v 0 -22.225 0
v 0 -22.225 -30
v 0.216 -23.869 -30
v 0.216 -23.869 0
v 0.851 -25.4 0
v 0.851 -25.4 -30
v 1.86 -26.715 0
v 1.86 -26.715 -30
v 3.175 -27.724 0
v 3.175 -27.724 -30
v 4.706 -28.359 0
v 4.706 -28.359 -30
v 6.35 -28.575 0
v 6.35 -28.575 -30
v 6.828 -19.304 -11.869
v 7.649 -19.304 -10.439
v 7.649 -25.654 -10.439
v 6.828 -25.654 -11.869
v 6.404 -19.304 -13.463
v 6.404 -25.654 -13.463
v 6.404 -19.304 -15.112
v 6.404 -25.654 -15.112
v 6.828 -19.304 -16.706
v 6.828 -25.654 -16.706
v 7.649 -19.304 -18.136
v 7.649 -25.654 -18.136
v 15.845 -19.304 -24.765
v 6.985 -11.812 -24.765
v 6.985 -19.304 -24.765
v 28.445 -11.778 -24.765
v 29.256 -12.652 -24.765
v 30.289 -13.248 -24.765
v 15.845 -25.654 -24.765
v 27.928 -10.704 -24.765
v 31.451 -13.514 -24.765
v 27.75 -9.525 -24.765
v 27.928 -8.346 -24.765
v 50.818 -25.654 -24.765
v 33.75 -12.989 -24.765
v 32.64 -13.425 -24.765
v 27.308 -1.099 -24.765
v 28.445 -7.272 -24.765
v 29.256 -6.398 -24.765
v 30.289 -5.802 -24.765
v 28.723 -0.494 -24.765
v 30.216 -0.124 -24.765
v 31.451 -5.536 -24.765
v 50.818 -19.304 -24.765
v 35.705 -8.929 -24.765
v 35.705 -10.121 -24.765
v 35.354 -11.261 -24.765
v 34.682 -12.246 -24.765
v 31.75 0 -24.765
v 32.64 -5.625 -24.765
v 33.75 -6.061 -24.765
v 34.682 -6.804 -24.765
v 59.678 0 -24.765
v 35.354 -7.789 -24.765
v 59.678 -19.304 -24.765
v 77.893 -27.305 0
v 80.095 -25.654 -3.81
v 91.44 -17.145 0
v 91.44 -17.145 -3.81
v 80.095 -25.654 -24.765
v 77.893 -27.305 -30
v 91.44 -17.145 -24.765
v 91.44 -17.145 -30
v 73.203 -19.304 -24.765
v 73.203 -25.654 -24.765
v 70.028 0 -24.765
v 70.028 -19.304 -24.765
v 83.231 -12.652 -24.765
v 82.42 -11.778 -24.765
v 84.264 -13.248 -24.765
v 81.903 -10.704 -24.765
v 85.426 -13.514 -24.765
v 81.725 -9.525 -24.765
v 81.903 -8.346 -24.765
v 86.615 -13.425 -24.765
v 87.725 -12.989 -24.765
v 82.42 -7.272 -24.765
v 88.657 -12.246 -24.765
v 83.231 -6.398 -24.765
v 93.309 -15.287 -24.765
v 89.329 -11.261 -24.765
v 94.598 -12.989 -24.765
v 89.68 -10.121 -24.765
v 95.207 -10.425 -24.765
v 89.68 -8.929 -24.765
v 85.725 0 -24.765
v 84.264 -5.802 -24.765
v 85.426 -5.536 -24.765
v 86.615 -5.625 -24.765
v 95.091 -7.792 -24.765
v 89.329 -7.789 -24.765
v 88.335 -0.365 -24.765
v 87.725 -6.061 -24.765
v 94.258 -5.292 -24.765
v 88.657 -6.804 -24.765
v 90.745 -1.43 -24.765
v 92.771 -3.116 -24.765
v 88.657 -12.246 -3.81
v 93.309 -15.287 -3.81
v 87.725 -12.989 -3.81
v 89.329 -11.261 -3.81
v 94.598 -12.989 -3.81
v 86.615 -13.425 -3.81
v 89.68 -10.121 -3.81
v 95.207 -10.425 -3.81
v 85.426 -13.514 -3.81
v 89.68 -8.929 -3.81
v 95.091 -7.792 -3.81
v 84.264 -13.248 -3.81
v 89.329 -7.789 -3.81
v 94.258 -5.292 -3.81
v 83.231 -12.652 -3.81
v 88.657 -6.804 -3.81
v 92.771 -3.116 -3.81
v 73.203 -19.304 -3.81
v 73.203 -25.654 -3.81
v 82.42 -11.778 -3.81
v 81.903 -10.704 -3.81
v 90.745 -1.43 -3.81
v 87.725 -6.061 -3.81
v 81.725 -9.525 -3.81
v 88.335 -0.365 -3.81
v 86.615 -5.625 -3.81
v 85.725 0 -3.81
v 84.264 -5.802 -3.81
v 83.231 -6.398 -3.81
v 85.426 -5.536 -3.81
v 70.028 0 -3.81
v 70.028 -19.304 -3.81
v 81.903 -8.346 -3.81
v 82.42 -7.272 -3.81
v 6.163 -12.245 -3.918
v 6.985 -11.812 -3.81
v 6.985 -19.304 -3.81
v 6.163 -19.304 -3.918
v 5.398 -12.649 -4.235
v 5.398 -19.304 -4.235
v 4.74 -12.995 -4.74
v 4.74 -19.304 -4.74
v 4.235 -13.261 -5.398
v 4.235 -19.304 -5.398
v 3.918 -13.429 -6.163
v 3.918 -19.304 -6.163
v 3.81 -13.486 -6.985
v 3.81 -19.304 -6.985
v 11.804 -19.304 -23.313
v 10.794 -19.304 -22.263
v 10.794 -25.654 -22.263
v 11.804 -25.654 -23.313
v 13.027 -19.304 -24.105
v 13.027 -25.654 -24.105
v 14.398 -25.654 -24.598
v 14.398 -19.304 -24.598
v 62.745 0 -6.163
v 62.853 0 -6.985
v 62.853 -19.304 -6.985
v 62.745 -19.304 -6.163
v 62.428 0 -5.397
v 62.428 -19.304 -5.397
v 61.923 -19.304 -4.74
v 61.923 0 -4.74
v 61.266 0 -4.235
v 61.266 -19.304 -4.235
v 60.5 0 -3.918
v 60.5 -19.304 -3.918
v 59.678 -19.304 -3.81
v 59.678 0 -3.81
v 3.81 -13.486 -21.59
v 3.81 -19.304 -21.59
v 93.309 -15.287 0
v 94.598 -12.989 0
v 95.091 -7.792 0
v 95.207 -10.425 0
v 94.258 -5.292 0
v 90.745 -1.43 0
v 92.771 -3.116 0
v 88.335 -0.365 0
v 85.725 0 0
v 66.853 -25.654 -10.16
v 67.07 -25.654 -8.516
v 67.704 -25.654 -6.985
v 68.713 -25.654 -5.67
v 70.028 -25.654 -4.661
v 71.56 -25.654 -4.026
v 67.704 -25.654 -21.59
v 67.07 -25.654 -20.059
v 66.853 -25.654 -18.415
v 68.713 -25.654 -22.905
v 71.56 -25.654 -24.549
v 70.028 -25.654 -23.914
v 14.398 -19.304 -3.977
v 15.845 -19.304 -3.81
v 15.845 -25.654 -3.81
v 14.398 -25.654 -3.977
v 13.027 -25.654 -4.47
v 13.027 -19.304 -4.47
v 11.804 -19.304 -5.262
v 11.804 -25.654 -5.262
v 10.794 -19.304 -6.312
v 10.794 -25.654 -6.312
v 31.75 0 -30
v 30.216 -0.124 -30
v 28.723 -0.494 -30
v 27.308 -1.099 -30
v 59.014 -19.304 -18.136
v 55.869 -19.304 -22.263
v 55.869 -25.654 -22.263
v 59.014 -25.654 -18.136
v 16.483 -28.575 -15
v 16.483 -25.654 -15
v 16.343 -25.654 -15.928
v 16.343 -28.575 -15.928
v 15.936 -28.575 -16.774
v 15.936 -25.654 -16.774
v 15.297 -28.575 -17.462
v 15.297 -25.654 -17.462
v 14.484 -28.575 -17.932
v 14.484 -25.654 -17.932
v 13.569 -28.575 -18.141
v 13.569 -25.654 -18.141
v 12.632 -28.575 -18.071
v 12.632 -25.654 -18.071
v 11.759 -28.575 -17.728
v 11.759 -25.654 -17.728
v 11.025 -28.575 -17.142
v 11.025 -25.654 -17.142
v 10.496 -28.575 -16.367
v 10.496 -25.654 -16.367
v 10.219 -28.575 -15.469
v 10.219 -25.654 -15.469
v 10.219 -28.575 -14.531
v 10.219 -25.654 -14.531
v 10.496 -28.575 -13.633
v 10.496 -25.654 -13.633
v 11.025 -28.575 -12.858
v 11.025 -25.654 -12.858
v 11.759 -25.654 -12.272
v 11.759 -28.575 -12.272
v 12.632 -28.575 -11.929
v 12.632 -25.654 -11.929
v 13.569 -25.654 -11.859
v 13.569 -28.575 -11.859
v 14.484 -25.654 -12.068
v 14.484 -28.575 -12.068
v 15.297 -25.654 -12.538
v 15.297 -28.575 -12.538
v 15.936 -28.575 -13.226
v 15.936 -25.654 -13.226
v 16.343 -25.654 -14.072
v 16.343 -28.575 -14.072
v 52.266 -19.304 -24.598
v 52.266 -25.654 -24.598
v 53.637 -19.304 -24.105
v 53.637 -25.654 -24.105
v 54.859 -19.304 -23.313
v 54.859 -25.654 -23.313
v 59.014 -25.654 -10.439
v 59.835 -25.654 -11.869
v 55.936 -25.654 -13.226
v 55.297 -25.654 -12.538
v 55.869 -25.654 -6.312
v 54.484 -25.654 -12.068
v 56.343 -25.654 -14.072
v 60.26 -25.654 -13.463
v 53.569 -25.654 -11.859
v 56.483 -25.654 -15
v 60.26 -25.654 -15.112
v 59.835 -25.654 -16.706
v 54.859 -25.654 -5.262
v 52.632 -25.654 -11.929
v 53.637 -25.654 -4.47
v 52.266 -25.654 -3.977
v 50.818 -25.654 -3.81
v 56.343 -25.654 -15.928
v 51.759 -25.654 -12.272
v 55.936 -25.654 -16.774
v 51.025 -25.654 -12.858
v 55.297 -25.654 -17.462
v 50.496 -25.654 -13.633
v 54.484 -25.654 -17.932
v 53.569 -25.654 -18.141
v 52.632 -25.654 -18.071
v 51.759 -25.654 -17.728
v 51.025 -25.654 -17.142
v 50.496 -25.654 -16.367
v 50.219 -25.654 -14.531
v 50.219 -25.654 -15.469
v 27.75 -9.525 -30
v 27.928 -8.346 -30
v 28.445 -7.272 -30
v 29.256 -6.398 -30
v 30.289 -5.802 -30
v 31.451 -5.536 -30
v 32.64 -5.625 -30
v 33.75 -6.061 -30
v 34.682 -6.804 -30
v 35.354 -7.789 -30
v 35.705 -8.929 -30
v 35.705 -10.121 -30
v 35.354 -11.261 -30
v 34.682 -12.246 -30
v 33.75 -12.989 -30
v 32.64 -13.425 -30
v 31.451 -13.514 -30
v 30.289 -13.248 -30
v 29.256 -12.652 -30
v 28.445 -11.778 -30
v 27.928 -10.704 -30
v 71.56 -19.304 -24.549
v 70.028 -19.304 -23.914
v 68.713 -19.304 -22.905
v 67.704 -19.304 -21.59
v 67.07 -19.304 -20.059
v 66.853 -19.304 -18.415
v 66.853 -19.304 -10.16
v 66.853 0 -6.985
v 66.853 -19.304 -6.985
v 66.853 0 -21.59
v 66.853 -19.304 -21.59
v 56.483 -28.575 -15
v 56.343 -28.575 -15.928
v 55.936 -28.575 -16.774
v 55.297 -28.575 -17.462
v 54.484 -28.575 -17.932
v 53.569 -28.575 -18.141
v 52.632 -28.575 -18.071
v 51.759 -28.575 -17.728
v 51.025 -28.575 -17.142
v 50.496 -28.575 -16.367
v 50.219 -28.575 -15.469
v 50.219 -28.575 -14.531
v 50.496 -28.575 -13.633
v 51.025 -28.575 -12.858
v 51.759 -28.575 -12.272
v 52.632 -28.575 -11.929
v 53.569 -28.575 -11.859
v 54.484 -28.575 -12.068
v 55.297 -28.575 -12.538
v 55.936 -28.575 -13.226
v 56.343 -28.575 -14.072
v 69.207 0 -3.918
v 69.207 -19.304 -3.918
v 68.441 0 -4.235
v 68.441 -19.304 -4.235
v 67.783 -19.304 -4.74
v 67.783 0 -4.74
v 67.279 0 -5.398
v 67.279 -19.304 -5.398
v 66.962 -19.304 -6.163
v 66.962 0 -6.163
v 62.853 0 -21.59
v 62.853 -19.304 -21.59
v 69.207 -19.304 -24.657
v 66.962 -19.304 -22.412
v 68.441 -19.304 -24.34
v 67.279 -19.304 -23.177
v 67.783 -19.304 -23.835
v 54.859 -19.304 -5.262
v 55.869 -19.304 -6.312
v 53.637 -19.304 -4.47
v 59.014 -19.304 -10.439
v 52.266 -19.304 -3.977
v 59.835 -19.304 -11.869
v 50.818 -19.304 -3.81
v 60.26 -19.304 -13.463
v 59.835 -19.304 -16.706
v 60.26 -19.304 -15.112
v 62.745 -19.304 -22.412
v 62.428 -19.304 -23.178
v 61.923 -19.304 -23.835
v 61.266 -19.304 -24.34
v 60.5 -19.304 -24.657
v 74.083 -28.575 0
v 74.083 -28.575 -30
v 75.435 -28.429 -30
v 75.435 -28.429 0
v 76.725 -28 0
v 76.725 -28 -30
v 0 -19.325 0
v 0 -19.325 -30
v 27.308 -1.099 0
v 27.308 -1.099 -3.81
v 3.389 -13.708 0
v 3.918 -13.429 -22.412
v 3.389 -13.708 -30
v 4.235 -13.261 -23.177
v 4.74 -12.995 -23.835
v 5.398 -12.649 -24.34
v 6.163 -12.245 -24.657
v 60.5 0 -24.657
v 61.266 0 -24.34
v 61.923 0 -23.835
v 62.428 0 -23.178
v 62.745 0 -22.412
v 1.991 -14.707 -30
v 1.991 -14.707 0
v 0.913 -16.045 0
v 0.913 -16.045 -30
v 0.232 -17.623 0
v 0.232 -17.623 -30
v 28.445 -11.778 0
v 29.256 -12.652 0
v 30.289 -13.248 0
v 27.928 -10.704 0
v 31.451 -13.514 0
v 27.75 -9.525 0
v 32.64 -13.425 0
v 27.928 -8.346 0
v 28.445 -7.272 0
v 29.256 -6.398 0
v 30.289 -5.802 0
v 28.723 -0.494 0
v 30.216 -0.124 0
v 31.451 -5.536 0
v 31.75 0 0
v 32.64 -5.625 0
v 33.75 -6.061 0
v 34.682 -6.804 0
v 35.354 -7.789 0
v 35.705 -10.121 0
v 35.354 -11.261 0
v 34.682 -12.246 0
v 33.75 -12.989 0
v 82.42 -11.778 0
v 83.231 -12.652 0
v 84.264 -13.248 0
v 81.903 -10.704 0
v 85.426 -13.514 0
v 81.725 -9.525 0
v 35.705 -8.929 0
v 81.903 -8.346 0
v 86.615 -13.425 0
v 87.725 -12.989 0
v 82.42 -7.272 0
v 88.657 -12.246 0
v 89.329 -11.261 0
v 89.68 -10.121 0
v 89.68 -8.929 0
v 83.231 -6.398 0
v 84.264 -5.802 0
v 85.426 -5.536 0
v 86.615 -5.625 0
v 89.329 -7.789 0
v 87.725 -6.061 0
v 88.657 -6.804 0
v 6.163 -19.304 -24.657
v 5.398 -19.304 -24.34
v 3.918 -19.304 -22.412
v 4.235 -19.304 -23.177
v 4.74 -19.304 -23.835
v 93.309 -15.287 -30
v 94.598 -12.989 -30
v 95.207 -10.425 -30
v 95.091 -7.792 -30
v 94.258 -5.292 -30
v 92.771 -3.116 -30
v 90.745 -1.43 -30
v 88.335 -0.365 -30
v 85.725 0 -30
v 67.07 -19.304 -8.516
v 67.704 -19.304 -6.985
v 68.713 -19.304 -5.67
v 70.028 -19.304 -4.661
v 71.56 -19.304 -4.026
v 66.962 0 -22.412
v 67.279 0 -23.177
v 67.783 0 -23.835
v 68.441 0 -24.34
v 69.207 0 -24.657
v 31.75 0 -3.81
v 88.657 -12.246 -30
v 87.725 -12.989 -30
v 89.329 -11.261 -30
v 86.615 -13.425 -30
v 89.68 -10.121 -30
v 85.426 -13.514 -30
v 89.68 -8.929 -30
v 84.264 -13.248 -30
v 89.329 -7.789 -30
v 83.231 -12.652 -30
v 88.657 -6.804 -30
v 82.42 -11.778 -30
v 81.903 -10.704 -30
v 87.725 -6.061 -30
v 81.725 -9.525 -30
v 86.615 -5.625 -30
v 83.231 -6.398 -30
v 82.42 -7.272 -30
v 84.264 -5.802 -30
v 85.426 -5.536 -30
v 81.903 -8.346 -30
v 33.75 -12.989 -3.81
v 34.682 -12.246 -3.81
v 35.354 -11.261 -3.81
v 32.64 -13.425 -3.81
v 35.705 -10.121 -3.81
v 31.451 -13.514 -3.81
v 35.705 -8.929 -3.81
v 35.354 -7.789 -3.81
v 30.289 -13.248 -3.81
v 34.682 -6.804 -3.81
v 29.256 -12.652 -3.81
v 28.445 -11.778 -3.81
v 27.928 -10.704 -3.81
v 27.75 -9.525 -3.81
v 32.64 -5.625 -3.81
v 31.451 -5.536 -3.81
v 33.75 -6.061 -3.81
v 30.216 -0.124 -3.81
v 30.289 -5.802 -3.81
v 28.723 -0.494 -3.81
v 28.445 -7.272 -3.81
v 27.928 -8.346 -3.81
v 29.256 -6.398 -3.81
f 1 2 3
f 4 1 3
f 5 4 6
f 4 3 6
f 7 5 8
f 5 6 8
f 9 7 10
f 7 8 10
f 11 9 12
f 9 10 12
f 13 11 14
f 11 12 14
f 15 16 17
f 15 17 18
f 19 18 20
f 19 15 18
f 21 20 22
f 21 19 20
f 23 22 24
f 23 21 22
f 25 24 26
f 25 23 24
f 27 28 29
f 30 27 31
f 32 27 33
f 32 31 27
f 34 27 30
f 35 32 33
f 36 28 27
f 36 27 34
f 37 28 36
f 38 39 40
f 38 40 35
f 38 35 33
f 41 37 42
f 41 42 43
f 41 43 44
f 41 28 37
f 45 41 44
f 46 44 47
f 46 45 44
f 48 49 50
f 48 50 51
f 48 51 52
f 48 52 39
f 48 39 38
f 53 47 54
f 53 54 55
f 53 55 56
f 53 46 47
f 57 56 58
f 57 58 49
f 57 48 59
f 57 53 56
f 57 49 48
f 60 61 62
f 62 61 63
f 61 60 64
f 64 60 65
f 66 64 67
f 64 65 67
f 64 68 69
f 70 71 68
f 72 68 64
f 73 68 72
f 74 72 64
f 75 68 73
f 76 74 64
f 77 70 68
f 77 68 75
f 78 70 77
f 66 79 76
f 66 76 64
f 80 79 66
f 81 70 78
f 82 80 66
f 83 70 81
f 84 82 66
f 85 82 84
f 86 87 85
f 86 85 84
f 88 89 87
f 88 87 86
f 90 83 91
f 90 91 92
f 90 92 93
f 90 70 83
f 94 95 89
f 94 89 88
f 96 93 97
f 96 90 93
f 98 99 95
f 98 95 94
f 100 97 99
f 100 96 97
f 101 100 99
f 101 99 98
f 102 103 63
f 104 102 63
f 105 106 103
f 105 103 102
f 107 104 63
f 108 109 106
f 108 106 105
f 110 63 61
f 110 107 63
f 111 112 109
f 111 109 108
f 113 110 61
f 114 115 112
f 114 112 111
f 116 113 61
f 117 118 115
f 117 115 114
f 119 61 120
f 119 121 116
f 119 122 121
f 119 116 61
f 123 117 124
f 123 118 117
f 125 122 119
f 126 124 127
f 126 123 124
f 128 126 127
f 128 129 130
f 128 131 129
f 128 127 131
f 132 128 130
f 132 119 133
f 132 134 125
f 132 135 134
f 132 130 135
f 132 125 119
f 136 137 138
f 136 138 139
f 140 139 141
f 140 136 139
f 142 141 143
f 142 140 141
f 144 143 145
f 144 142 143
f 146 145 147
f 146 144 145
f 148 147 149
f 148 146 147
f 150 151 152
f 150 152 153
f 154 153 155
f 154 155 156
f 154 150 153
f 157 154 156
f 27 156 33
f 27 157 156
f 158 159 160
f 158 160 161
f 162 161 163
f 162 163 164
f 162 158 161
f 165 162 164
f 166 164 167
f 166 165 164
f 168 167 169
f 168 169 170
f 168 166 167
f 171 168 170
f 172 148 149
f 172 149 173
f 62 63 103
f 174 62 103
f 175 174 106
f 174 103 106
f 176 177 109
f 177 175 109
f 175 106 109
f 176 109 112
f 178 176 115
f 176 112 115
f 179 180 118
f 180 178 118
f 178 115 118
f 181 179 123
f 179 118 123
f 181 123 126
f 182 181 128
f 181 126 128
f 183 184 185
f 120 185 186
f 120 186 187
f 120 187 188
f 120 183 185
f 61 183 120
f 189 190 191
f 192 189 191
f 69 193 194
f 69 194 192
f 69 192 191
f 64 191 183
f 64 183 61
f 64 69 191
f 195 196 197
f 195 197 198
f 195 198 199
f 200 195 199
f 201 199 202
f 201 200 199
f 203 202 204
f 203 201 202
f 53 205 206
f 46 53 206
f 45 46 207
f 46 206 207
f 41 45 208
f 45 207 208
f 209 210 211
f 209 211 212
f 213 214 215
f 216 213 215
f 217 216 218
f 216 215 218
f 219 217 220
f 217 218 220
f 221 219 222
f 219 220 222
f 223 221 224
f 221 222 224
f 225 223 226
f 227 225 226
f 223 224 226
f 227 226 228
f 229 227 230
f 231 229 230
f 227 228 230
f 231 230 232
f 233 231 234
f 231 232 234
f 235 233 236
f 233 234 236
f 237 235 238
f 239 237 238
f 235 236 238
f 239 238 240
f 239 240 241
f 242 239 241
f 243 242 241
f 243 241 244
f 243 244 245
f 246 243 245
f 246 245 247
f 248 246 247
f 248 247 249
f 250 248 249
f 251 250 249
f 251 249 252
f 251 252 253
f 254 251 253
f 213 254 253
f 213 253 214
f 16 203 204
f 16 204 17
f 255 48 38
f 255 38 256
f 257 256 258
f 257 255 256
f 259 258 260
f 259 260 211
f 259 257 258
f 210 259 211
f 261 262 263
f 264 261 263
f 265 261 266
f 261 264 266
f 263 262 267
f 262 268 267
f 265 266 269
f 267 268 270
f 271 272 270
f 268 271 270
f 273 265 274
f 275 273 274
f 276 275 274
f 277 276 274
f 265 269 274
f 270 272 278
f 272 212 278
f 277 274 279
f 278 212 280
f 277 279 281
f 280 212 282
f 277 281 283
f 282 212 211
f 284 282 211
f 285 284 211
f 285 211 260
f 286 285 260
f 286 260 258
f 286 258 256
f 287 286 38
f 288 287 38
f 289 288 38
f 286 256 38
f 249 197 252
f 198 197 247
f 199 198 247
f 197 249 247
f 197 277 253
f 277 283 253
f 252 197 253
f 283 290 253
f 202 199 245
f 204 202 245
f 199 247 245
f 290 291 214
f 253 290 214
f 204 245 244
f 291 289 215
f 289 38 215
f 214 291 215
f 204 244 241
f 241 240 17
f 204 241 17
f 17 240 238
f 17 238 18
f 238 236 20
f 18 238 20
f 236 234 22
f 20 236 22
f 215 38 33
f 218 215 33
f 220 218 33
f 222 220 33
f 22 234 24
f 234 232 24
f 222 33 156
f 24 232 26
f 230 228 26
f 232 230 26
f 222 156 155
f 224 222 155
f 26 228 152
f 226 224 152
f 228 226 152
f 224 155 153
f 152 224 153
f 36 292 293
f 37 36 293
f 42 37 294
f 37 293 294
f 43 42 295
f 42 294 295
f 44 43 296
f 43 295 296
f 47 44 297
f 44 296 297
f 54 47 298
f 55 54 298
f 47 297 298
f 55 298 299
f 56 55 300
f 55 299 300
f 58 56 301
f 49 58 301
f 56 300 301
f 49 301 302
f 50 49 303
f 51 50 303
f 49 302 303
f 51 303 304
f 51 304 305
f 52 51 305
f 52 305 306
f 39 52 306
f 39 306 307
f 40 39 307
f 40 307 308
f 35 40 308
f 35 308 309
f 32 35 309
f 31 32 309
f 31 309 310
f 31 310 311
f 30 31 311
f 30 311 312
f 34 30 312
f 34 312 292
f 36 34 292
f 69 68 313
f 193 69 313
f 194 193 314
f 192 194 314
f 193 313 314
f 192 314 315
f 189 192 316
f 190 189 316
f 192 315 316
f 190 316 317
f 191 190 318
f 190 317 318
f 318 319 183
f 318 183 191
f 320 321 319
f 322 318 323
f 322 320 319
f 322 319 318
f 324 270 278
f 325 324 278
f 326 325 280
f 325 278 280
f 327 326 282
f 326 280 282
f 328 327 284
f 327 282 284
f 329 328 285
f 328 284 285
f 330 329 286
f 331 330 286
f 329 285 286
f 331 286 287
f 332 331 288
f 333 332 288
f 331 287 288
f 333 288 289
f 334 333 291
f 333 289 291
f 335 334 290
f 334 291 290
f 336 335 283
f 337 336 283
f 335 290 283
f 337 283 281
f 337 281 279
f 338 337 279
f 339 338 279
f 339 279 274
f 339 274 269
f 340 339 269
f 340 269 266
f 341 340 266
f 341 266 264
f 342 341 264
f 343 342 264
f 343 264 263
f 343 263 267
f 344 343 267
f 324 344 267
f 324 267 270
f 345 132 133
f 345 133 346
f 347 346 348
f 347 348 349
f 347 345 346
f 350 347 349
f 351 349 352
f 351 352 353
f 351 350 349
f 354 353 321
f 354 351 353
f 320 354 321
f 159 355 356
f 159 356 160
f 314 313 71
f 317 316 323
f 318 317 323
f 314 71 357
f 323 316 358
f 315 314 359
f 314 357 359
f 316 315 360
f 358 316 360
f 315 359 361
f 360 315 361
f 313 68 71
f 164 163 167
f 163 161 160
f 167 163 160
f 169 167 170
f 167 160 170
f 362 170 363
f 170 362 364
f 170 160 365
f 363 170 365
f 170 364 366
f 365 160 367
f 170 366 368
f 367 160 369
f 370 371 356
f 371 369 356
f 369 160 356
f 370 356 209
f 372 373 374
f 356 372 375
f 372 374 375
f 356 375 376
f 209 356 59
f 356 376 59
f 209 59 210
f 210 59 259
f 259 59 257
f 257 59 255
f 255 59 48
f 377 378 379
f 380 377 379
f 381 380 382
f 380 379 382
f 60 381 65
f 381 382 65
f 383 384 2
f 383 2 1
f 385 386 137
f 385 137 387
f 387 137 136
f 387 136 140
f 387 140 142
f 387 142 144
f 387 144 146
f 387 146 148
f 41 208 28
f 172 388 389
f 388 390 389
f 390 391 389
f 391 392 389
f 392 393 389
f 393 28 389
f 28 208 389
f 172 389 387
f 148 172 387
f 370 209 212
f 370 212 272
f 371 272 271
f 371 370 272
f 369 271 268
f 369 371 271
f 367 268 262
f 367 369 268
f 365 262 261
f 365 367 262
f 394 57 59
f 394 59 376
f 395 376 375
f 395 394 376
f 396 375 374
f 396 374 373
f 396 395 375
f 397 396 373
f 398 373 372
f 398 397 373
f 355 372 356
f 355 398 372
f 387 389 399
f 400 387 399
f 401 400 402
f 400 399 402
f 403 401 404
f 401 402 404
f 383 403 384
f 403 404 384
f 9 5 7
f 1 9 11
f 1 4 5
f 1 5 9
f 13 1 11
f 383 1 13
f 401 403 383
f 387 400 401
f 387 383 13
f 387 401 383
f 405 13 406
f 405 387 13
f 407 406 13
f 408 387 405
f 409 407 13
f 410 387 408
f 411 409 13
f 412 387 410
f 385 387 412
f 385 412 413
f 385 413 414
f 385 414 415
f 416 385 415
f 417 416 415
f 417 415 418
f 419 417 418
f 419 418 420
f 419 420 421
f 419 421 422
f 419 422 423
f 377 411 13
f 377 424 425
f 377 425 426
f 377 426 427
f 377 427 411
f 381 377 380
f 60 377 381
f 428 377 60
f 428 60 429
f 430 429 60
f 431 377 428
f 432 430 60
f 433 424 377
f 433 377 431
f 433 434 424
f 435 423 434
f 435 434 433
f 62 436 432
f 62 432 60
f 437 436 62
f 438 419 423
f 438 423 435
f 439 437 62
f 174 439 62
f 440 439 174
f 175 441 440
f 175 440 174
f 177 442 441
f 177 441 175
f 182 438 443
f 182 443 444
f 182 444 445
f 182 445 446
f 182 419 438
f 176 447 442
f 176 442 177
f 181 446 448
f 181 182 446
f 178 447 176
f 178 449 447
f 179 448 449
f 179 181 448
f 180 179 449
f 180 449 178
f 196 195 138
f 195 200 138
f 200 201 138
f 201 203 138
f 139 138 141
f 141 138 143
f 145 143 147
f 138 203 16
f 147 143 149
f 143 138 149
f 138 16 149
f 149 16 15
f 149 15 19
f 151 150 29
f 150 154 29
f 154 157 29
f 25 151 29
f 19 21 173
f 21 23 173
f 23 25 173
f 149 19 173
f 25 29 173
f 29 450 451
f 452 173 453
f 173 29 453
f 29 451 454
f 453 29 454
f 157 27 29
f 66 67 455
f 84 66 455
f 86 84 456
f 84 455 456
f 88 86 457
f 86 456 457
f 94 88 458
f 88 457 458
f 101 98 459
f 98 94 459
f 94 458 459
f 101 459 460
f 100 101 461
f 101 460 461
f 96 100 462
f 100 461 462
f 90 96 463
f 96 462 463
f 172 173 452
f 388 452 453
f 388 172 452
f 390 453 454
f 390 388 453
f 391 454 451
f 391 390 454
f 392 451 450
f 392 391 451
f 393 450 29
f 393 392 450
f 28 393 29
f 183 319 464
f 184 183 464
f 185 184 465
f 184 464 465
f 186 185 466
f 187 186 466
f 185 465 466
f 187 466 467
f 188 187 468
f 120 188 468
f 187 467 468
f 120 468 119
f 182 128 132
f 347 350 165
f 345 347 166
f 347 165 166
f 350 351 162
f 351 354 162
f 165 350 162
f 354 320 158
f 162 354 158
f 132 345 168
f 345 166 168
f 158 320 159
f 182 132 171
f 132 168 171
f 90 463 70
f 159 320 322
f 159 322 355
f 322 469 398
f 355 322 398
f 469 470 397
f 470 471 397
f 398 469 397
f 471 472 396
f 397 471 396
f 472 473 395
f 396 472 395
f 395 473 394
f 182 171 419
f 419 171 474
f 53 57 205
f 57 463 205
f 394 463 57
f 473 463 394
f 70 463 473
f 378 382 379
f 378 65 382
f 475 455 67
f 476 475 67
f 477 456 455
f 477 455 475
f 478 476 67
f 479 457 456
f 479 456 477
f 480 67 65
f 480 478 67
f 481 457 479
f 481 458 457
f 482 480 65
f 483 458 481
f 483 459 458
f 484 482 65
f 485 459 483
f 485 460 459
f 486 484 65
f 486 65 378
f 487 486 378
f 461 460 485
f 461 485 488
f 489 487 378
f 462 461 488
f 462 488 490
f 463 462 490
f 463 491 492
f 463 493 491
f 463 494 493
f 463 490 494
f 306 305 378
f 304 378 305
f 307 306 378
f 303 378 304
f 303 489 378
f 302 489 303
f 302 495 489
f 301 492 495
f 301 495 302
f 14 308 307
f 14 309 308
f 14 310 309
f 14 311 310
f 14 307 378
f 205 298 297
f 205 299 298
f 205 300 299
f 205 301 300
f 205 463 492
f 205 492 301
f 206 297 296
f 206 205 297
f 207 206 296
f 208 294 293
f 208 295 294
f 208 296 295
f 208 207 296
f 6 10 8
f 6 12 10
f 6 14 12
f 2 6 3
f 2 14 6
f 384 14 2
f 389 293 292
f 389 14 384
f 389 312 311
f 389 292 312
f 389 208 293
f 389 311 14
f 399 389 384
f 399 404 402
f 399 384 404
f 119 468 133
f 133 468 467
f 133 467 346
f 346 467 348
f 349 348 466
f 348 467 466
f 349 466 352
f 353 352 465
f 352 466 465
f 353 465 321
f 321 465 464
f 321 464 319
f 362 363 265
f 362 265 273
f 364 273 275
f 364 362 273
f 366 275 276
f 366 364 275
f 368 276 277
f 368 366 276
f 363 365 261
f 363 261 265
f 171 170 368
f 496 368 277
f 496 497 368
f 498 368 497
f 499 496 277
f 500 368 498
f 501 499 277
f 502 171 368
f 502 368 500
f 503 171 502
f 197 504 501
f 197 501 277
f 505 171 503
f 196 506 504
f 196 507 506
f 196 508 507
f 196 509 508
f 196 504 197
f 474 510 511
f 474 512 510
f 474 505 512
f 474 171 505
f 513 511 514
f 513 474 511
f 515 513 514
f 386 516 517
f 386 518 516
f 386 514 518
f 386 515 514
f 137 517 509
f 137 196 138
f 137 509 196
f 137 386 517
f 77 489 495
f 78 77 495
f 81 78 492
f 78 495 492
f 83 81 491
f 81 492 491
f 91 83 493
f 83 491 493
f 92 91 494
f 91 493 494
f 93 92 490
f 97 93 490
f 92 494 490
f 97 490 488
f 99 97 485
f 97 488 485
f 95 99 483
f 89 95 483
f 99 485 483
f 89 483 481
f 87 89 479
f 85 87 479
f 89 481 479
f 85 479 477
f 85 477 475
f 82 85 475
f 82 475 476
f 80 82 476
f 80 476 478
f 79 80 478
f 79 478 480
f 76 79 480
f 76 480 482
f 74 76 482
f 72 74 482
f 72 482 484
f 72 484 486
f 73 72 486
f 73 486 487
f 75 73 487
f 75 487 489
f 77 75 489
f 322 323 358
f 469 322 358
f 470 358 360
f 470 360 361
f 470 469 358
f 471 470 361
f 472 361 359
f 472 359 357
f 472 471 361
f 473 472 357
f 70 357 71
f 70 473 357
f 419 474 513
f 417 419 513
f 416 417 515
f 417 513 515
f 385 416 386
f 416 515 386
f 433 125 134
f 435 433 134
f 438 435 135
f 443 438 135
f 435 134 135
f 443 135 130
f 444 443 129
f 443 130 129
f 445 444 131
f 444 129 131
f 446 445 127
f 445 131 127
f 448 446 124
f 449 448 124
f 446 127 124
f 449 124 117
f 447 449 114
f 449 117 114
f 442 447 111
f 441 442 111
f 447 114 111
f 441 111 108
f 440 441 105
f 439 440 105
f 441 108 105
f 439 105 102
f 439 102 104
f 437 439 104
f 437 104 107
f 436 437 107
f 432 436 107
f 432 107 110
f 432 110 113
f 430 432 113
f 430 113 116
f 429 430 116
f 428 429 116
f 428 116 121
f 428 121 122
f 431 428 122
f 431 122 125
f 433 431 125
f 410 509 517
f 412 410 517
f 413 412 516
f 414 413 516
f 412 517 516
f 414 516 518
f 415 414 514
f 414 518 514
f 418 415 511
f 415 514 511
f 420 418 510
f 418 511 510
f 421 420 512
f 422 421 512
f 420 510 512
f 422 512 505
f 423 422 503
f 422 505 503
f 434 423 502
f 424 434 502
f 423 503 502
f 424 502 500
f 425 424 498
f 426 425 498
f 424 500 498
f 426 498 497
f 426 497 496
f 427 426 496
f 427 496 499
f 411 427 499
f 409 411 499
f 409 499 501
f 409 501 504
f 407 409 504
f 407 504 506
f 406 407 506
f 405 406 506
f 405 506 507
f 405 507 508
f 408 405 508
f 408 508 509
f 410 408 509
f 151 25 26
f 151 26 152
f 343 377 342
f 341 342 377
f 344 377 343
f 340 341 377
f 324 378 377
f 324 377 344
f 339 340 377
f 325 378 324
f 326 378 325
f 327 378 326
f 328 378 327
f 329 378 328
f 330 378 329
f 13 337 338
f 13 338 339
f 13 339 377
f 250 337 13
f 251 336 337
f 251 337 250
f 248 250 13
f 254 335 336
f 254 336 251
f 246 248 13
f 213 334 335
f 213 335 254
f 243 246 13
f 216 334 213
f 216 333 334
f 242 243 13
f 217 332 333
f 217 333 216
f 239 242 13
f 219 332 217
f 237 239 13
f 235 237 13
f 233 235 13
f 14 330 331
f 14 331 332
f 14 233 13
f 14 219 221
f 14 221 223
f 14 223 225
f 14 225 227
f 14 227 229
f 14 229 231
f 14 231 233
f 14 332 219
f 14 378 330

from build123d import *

# Parameters (mm, degrees)
SKETCH1_R           = 3.149606299
BOSS_EXTRUDE1_DEPTH = 28.575
CUT_EXTRUDE1_DEPTH  = 19.304
CUT_EXTRUDE7_DEPTH  = 6.35
SKETCH5_R           = 4
CUT_EXTRUDE3_DEPTH  = 31


with BuildPart() as part:
    # Sketch1 → Boss-Extrude1 (new body)
    with BuildSketch(Plane(origin=(0, 0, 0), x_dir=(1, 0, 0), z_dir=(0, 1, 0))):
        Polygon((0, 6.666666667), (0, 23.333333333), (0, 30), (6.666666667, 30), (93.333333333, 30), (100, 30), (100, 0), (93.333333333, 0), (6.666666667, 0), (0, 0), align=None)
        with Locations((13.333333333, 15)):
            Circle(SKETCH1_R, mode=Mode.SUBTRACT)
        with Locations((53.333333333, 15)):
            Circle(SKETCH1_R, mode=Mode.SUBTRACT)
    extrude(amount=-BOSS_EXTRUDE1_DEPTH)

    # Sketch2 → Cut-Extrude1 (cut)
    with BuildSketch(Plane(origin=(0, 0, 0), x_dir=(1, 0, 0), z_dir=(0, 1, 0))):
        with BuildLine():
            Line((3.810000003, 6.985), (3.810000003, 21.59))
            ThreePointArc((3.810000003, 21.59), (4.739935973, 23.83506403), (6.985000003, 24.765))
            Line((6.985000003, 24.765), (59.678333333, 24.765))
            ThreePointArc((59.678333333, 24.765), (61.923397364, 23.83506403), (62.853333333, 21.59))
            Line((62.853333333, 21.59), (62.853333333, 6.985))
            ThreePointArc((62.853333333, 6.985), (61.923397364, 4.73993597), (59.678333333, 3.81))
            Line((59.678333333, 3.81), (6.985000003, 3.81))
            ThreePointArc((6.985000003, 3.81), (4.739935973, 4.73993597), (3.810000003, 6.985))
        make_face()
        with BuildLine():
            Line((66.853333333, 6.985), (66.853333333, 21.59))
            ThreePointArc((66.853333333, 21.59), (67.783269303, 23.83506403), (70.028333333, 24.765))
            Line((70.028333333, 24.765), (95.25, 24.765))
            Line((95.25, 24.765), (95.25, 3.81))
            Line((95.25, 3.81), (70.028333333, 3.81))
            ThreePointArc((70.028333333, 3.81), (67.783269303, 4.73993597), (66.853333333, 6.985))
        make_face()
    extrude(amount=-CUT_EXTRUDE1_DEPTH, mode=Mode.SUBTRACT)

    # Sketch9 → Cut-Extrude7 (cut)
    with BuildSketch(Plane(origin=(0, -19.304, 0), x_dir=(1, 0, 0), z_dir=(0, 1, 0))):
        with BuildLine():
            Line((7.649092718, 18.135984848), (10.793997252, 22.263484848))
            ThreePointArc((10.793997252, 22.263484848), (13.026694001, 24.105359338), (15.844904534, 24.765))
            Line((15.844904534, 24.765), (50.818428803, 24.765))
            ThreePointArc((50.818428803, 24.765), (53.636639335, 24.105359338), (55.869336085, 22.263484848))
            Line((55.869336085, 22.263484848), (59.014240619, 18.135984848))
            ThreePointArc((59.014240619, 18.135984848), (60.313333337, 14.2875), (59.014240619, 10.439015152))
            Line((59.014240619, 10.439015152), (55.869336085, 6.311515152))
            ThreePointArc((55.869336085, 6.311515152), (53.636639335, 4.469640662), (50.818428803, 3.81))
            Line((50.818428803, 3.81), (15.844904534, 3.81))
            ThreePointArc((15.844904534, 3.81), (13.026694001, 4.469640662), (10.793997252, 6.311515152))
            Line((10.793997252, 6.311515152), (7.649092718, 10.439015152))
            ThreePointArc((7.649092718, 10.439015152), (6.35, 14.2875), (7.649092718, 18.135984848))
        make_face()
        with BuildLine():
            Line((66.853333333, 18.415), (66.853333333, 10.16))
            ThreePointArc((66.853333333, 10.16), (68.713205273, 5.669871939), (73.203333333, 3.81))
            Line((73.203333333, 3.81), (95.25, 3.81))
            Line((95.25, 3.81), (95.25, 24.765))
            Line((95.25, 24.765), (73.203333333, 24.765))
            ThreePointArc((73.203333333, 24.765), (68.713205273, 22.905128061), (66.853333333, 18.415))
        make_face()
    extrude(amount=-CUT_EXTRUDE7_DEPTH, mode=Mode.SUBTRACT)

    # Sketch5 → Cut-Extrude3 (cut, through all)
    with BuildSketch(Plane(origin=(0, 0, -30), x_dir=(-1, 0, 0), z_dir=(0, 0, -1))):
        with BuildLine():
            Line((0, 0), (-31.75, 0))
            ThreePointArc((-31.75, 0), (-29.462234044, -0.278825011), (-27.308407483, -1.098975973))
            Line((-27.308407483, -1.098975973), (-3.388938322, -13.707595992))
            ThreePointArc((-3.388938322, -13.707595992), (-0.912848096, -16.044719868), (0, -19.324945344))
            Line((0, -19.324945344), (0, 0))
        make_face()
        with BuildLine():
            ThreePointArc((0, -22.225), (-1.859871939, -26.715128061), (-6.35, -28.575))
            Line((-6.35, -28.575), (0, -28.575))
            Line((0, -28.575), (0, -22.225))
        make_face()
        with BuildLine():
            Line((-77.893333333, -27.305), (-91.44, -17.145))
            ThreePointArc((-91.44, -17.145), (-94.761208414, -6.512930529), (-85.725, 0))
            Line((-85.725, 0), (-100, 0))
            Line((-100, 0), (-100, -28.575))
            Line((-100, -28.575), (-74.083333333, -28.575))
            ThreePointArc((-74.083333333, -28.575), (-76.091379648, -28.249138943), (-77.893333333, -27.305))
        make_face()
        with Locations((-85.725, -9.525)):
            Circle(SKETCH5_R)
        with Locations((-31.75, -9.525)):
            Circle(SKETCH5_R)
    extrude(amount=-CUT_EXTRUDE3_DEPTH, mode=Mode.SUBTRACT)


solid = part.part
